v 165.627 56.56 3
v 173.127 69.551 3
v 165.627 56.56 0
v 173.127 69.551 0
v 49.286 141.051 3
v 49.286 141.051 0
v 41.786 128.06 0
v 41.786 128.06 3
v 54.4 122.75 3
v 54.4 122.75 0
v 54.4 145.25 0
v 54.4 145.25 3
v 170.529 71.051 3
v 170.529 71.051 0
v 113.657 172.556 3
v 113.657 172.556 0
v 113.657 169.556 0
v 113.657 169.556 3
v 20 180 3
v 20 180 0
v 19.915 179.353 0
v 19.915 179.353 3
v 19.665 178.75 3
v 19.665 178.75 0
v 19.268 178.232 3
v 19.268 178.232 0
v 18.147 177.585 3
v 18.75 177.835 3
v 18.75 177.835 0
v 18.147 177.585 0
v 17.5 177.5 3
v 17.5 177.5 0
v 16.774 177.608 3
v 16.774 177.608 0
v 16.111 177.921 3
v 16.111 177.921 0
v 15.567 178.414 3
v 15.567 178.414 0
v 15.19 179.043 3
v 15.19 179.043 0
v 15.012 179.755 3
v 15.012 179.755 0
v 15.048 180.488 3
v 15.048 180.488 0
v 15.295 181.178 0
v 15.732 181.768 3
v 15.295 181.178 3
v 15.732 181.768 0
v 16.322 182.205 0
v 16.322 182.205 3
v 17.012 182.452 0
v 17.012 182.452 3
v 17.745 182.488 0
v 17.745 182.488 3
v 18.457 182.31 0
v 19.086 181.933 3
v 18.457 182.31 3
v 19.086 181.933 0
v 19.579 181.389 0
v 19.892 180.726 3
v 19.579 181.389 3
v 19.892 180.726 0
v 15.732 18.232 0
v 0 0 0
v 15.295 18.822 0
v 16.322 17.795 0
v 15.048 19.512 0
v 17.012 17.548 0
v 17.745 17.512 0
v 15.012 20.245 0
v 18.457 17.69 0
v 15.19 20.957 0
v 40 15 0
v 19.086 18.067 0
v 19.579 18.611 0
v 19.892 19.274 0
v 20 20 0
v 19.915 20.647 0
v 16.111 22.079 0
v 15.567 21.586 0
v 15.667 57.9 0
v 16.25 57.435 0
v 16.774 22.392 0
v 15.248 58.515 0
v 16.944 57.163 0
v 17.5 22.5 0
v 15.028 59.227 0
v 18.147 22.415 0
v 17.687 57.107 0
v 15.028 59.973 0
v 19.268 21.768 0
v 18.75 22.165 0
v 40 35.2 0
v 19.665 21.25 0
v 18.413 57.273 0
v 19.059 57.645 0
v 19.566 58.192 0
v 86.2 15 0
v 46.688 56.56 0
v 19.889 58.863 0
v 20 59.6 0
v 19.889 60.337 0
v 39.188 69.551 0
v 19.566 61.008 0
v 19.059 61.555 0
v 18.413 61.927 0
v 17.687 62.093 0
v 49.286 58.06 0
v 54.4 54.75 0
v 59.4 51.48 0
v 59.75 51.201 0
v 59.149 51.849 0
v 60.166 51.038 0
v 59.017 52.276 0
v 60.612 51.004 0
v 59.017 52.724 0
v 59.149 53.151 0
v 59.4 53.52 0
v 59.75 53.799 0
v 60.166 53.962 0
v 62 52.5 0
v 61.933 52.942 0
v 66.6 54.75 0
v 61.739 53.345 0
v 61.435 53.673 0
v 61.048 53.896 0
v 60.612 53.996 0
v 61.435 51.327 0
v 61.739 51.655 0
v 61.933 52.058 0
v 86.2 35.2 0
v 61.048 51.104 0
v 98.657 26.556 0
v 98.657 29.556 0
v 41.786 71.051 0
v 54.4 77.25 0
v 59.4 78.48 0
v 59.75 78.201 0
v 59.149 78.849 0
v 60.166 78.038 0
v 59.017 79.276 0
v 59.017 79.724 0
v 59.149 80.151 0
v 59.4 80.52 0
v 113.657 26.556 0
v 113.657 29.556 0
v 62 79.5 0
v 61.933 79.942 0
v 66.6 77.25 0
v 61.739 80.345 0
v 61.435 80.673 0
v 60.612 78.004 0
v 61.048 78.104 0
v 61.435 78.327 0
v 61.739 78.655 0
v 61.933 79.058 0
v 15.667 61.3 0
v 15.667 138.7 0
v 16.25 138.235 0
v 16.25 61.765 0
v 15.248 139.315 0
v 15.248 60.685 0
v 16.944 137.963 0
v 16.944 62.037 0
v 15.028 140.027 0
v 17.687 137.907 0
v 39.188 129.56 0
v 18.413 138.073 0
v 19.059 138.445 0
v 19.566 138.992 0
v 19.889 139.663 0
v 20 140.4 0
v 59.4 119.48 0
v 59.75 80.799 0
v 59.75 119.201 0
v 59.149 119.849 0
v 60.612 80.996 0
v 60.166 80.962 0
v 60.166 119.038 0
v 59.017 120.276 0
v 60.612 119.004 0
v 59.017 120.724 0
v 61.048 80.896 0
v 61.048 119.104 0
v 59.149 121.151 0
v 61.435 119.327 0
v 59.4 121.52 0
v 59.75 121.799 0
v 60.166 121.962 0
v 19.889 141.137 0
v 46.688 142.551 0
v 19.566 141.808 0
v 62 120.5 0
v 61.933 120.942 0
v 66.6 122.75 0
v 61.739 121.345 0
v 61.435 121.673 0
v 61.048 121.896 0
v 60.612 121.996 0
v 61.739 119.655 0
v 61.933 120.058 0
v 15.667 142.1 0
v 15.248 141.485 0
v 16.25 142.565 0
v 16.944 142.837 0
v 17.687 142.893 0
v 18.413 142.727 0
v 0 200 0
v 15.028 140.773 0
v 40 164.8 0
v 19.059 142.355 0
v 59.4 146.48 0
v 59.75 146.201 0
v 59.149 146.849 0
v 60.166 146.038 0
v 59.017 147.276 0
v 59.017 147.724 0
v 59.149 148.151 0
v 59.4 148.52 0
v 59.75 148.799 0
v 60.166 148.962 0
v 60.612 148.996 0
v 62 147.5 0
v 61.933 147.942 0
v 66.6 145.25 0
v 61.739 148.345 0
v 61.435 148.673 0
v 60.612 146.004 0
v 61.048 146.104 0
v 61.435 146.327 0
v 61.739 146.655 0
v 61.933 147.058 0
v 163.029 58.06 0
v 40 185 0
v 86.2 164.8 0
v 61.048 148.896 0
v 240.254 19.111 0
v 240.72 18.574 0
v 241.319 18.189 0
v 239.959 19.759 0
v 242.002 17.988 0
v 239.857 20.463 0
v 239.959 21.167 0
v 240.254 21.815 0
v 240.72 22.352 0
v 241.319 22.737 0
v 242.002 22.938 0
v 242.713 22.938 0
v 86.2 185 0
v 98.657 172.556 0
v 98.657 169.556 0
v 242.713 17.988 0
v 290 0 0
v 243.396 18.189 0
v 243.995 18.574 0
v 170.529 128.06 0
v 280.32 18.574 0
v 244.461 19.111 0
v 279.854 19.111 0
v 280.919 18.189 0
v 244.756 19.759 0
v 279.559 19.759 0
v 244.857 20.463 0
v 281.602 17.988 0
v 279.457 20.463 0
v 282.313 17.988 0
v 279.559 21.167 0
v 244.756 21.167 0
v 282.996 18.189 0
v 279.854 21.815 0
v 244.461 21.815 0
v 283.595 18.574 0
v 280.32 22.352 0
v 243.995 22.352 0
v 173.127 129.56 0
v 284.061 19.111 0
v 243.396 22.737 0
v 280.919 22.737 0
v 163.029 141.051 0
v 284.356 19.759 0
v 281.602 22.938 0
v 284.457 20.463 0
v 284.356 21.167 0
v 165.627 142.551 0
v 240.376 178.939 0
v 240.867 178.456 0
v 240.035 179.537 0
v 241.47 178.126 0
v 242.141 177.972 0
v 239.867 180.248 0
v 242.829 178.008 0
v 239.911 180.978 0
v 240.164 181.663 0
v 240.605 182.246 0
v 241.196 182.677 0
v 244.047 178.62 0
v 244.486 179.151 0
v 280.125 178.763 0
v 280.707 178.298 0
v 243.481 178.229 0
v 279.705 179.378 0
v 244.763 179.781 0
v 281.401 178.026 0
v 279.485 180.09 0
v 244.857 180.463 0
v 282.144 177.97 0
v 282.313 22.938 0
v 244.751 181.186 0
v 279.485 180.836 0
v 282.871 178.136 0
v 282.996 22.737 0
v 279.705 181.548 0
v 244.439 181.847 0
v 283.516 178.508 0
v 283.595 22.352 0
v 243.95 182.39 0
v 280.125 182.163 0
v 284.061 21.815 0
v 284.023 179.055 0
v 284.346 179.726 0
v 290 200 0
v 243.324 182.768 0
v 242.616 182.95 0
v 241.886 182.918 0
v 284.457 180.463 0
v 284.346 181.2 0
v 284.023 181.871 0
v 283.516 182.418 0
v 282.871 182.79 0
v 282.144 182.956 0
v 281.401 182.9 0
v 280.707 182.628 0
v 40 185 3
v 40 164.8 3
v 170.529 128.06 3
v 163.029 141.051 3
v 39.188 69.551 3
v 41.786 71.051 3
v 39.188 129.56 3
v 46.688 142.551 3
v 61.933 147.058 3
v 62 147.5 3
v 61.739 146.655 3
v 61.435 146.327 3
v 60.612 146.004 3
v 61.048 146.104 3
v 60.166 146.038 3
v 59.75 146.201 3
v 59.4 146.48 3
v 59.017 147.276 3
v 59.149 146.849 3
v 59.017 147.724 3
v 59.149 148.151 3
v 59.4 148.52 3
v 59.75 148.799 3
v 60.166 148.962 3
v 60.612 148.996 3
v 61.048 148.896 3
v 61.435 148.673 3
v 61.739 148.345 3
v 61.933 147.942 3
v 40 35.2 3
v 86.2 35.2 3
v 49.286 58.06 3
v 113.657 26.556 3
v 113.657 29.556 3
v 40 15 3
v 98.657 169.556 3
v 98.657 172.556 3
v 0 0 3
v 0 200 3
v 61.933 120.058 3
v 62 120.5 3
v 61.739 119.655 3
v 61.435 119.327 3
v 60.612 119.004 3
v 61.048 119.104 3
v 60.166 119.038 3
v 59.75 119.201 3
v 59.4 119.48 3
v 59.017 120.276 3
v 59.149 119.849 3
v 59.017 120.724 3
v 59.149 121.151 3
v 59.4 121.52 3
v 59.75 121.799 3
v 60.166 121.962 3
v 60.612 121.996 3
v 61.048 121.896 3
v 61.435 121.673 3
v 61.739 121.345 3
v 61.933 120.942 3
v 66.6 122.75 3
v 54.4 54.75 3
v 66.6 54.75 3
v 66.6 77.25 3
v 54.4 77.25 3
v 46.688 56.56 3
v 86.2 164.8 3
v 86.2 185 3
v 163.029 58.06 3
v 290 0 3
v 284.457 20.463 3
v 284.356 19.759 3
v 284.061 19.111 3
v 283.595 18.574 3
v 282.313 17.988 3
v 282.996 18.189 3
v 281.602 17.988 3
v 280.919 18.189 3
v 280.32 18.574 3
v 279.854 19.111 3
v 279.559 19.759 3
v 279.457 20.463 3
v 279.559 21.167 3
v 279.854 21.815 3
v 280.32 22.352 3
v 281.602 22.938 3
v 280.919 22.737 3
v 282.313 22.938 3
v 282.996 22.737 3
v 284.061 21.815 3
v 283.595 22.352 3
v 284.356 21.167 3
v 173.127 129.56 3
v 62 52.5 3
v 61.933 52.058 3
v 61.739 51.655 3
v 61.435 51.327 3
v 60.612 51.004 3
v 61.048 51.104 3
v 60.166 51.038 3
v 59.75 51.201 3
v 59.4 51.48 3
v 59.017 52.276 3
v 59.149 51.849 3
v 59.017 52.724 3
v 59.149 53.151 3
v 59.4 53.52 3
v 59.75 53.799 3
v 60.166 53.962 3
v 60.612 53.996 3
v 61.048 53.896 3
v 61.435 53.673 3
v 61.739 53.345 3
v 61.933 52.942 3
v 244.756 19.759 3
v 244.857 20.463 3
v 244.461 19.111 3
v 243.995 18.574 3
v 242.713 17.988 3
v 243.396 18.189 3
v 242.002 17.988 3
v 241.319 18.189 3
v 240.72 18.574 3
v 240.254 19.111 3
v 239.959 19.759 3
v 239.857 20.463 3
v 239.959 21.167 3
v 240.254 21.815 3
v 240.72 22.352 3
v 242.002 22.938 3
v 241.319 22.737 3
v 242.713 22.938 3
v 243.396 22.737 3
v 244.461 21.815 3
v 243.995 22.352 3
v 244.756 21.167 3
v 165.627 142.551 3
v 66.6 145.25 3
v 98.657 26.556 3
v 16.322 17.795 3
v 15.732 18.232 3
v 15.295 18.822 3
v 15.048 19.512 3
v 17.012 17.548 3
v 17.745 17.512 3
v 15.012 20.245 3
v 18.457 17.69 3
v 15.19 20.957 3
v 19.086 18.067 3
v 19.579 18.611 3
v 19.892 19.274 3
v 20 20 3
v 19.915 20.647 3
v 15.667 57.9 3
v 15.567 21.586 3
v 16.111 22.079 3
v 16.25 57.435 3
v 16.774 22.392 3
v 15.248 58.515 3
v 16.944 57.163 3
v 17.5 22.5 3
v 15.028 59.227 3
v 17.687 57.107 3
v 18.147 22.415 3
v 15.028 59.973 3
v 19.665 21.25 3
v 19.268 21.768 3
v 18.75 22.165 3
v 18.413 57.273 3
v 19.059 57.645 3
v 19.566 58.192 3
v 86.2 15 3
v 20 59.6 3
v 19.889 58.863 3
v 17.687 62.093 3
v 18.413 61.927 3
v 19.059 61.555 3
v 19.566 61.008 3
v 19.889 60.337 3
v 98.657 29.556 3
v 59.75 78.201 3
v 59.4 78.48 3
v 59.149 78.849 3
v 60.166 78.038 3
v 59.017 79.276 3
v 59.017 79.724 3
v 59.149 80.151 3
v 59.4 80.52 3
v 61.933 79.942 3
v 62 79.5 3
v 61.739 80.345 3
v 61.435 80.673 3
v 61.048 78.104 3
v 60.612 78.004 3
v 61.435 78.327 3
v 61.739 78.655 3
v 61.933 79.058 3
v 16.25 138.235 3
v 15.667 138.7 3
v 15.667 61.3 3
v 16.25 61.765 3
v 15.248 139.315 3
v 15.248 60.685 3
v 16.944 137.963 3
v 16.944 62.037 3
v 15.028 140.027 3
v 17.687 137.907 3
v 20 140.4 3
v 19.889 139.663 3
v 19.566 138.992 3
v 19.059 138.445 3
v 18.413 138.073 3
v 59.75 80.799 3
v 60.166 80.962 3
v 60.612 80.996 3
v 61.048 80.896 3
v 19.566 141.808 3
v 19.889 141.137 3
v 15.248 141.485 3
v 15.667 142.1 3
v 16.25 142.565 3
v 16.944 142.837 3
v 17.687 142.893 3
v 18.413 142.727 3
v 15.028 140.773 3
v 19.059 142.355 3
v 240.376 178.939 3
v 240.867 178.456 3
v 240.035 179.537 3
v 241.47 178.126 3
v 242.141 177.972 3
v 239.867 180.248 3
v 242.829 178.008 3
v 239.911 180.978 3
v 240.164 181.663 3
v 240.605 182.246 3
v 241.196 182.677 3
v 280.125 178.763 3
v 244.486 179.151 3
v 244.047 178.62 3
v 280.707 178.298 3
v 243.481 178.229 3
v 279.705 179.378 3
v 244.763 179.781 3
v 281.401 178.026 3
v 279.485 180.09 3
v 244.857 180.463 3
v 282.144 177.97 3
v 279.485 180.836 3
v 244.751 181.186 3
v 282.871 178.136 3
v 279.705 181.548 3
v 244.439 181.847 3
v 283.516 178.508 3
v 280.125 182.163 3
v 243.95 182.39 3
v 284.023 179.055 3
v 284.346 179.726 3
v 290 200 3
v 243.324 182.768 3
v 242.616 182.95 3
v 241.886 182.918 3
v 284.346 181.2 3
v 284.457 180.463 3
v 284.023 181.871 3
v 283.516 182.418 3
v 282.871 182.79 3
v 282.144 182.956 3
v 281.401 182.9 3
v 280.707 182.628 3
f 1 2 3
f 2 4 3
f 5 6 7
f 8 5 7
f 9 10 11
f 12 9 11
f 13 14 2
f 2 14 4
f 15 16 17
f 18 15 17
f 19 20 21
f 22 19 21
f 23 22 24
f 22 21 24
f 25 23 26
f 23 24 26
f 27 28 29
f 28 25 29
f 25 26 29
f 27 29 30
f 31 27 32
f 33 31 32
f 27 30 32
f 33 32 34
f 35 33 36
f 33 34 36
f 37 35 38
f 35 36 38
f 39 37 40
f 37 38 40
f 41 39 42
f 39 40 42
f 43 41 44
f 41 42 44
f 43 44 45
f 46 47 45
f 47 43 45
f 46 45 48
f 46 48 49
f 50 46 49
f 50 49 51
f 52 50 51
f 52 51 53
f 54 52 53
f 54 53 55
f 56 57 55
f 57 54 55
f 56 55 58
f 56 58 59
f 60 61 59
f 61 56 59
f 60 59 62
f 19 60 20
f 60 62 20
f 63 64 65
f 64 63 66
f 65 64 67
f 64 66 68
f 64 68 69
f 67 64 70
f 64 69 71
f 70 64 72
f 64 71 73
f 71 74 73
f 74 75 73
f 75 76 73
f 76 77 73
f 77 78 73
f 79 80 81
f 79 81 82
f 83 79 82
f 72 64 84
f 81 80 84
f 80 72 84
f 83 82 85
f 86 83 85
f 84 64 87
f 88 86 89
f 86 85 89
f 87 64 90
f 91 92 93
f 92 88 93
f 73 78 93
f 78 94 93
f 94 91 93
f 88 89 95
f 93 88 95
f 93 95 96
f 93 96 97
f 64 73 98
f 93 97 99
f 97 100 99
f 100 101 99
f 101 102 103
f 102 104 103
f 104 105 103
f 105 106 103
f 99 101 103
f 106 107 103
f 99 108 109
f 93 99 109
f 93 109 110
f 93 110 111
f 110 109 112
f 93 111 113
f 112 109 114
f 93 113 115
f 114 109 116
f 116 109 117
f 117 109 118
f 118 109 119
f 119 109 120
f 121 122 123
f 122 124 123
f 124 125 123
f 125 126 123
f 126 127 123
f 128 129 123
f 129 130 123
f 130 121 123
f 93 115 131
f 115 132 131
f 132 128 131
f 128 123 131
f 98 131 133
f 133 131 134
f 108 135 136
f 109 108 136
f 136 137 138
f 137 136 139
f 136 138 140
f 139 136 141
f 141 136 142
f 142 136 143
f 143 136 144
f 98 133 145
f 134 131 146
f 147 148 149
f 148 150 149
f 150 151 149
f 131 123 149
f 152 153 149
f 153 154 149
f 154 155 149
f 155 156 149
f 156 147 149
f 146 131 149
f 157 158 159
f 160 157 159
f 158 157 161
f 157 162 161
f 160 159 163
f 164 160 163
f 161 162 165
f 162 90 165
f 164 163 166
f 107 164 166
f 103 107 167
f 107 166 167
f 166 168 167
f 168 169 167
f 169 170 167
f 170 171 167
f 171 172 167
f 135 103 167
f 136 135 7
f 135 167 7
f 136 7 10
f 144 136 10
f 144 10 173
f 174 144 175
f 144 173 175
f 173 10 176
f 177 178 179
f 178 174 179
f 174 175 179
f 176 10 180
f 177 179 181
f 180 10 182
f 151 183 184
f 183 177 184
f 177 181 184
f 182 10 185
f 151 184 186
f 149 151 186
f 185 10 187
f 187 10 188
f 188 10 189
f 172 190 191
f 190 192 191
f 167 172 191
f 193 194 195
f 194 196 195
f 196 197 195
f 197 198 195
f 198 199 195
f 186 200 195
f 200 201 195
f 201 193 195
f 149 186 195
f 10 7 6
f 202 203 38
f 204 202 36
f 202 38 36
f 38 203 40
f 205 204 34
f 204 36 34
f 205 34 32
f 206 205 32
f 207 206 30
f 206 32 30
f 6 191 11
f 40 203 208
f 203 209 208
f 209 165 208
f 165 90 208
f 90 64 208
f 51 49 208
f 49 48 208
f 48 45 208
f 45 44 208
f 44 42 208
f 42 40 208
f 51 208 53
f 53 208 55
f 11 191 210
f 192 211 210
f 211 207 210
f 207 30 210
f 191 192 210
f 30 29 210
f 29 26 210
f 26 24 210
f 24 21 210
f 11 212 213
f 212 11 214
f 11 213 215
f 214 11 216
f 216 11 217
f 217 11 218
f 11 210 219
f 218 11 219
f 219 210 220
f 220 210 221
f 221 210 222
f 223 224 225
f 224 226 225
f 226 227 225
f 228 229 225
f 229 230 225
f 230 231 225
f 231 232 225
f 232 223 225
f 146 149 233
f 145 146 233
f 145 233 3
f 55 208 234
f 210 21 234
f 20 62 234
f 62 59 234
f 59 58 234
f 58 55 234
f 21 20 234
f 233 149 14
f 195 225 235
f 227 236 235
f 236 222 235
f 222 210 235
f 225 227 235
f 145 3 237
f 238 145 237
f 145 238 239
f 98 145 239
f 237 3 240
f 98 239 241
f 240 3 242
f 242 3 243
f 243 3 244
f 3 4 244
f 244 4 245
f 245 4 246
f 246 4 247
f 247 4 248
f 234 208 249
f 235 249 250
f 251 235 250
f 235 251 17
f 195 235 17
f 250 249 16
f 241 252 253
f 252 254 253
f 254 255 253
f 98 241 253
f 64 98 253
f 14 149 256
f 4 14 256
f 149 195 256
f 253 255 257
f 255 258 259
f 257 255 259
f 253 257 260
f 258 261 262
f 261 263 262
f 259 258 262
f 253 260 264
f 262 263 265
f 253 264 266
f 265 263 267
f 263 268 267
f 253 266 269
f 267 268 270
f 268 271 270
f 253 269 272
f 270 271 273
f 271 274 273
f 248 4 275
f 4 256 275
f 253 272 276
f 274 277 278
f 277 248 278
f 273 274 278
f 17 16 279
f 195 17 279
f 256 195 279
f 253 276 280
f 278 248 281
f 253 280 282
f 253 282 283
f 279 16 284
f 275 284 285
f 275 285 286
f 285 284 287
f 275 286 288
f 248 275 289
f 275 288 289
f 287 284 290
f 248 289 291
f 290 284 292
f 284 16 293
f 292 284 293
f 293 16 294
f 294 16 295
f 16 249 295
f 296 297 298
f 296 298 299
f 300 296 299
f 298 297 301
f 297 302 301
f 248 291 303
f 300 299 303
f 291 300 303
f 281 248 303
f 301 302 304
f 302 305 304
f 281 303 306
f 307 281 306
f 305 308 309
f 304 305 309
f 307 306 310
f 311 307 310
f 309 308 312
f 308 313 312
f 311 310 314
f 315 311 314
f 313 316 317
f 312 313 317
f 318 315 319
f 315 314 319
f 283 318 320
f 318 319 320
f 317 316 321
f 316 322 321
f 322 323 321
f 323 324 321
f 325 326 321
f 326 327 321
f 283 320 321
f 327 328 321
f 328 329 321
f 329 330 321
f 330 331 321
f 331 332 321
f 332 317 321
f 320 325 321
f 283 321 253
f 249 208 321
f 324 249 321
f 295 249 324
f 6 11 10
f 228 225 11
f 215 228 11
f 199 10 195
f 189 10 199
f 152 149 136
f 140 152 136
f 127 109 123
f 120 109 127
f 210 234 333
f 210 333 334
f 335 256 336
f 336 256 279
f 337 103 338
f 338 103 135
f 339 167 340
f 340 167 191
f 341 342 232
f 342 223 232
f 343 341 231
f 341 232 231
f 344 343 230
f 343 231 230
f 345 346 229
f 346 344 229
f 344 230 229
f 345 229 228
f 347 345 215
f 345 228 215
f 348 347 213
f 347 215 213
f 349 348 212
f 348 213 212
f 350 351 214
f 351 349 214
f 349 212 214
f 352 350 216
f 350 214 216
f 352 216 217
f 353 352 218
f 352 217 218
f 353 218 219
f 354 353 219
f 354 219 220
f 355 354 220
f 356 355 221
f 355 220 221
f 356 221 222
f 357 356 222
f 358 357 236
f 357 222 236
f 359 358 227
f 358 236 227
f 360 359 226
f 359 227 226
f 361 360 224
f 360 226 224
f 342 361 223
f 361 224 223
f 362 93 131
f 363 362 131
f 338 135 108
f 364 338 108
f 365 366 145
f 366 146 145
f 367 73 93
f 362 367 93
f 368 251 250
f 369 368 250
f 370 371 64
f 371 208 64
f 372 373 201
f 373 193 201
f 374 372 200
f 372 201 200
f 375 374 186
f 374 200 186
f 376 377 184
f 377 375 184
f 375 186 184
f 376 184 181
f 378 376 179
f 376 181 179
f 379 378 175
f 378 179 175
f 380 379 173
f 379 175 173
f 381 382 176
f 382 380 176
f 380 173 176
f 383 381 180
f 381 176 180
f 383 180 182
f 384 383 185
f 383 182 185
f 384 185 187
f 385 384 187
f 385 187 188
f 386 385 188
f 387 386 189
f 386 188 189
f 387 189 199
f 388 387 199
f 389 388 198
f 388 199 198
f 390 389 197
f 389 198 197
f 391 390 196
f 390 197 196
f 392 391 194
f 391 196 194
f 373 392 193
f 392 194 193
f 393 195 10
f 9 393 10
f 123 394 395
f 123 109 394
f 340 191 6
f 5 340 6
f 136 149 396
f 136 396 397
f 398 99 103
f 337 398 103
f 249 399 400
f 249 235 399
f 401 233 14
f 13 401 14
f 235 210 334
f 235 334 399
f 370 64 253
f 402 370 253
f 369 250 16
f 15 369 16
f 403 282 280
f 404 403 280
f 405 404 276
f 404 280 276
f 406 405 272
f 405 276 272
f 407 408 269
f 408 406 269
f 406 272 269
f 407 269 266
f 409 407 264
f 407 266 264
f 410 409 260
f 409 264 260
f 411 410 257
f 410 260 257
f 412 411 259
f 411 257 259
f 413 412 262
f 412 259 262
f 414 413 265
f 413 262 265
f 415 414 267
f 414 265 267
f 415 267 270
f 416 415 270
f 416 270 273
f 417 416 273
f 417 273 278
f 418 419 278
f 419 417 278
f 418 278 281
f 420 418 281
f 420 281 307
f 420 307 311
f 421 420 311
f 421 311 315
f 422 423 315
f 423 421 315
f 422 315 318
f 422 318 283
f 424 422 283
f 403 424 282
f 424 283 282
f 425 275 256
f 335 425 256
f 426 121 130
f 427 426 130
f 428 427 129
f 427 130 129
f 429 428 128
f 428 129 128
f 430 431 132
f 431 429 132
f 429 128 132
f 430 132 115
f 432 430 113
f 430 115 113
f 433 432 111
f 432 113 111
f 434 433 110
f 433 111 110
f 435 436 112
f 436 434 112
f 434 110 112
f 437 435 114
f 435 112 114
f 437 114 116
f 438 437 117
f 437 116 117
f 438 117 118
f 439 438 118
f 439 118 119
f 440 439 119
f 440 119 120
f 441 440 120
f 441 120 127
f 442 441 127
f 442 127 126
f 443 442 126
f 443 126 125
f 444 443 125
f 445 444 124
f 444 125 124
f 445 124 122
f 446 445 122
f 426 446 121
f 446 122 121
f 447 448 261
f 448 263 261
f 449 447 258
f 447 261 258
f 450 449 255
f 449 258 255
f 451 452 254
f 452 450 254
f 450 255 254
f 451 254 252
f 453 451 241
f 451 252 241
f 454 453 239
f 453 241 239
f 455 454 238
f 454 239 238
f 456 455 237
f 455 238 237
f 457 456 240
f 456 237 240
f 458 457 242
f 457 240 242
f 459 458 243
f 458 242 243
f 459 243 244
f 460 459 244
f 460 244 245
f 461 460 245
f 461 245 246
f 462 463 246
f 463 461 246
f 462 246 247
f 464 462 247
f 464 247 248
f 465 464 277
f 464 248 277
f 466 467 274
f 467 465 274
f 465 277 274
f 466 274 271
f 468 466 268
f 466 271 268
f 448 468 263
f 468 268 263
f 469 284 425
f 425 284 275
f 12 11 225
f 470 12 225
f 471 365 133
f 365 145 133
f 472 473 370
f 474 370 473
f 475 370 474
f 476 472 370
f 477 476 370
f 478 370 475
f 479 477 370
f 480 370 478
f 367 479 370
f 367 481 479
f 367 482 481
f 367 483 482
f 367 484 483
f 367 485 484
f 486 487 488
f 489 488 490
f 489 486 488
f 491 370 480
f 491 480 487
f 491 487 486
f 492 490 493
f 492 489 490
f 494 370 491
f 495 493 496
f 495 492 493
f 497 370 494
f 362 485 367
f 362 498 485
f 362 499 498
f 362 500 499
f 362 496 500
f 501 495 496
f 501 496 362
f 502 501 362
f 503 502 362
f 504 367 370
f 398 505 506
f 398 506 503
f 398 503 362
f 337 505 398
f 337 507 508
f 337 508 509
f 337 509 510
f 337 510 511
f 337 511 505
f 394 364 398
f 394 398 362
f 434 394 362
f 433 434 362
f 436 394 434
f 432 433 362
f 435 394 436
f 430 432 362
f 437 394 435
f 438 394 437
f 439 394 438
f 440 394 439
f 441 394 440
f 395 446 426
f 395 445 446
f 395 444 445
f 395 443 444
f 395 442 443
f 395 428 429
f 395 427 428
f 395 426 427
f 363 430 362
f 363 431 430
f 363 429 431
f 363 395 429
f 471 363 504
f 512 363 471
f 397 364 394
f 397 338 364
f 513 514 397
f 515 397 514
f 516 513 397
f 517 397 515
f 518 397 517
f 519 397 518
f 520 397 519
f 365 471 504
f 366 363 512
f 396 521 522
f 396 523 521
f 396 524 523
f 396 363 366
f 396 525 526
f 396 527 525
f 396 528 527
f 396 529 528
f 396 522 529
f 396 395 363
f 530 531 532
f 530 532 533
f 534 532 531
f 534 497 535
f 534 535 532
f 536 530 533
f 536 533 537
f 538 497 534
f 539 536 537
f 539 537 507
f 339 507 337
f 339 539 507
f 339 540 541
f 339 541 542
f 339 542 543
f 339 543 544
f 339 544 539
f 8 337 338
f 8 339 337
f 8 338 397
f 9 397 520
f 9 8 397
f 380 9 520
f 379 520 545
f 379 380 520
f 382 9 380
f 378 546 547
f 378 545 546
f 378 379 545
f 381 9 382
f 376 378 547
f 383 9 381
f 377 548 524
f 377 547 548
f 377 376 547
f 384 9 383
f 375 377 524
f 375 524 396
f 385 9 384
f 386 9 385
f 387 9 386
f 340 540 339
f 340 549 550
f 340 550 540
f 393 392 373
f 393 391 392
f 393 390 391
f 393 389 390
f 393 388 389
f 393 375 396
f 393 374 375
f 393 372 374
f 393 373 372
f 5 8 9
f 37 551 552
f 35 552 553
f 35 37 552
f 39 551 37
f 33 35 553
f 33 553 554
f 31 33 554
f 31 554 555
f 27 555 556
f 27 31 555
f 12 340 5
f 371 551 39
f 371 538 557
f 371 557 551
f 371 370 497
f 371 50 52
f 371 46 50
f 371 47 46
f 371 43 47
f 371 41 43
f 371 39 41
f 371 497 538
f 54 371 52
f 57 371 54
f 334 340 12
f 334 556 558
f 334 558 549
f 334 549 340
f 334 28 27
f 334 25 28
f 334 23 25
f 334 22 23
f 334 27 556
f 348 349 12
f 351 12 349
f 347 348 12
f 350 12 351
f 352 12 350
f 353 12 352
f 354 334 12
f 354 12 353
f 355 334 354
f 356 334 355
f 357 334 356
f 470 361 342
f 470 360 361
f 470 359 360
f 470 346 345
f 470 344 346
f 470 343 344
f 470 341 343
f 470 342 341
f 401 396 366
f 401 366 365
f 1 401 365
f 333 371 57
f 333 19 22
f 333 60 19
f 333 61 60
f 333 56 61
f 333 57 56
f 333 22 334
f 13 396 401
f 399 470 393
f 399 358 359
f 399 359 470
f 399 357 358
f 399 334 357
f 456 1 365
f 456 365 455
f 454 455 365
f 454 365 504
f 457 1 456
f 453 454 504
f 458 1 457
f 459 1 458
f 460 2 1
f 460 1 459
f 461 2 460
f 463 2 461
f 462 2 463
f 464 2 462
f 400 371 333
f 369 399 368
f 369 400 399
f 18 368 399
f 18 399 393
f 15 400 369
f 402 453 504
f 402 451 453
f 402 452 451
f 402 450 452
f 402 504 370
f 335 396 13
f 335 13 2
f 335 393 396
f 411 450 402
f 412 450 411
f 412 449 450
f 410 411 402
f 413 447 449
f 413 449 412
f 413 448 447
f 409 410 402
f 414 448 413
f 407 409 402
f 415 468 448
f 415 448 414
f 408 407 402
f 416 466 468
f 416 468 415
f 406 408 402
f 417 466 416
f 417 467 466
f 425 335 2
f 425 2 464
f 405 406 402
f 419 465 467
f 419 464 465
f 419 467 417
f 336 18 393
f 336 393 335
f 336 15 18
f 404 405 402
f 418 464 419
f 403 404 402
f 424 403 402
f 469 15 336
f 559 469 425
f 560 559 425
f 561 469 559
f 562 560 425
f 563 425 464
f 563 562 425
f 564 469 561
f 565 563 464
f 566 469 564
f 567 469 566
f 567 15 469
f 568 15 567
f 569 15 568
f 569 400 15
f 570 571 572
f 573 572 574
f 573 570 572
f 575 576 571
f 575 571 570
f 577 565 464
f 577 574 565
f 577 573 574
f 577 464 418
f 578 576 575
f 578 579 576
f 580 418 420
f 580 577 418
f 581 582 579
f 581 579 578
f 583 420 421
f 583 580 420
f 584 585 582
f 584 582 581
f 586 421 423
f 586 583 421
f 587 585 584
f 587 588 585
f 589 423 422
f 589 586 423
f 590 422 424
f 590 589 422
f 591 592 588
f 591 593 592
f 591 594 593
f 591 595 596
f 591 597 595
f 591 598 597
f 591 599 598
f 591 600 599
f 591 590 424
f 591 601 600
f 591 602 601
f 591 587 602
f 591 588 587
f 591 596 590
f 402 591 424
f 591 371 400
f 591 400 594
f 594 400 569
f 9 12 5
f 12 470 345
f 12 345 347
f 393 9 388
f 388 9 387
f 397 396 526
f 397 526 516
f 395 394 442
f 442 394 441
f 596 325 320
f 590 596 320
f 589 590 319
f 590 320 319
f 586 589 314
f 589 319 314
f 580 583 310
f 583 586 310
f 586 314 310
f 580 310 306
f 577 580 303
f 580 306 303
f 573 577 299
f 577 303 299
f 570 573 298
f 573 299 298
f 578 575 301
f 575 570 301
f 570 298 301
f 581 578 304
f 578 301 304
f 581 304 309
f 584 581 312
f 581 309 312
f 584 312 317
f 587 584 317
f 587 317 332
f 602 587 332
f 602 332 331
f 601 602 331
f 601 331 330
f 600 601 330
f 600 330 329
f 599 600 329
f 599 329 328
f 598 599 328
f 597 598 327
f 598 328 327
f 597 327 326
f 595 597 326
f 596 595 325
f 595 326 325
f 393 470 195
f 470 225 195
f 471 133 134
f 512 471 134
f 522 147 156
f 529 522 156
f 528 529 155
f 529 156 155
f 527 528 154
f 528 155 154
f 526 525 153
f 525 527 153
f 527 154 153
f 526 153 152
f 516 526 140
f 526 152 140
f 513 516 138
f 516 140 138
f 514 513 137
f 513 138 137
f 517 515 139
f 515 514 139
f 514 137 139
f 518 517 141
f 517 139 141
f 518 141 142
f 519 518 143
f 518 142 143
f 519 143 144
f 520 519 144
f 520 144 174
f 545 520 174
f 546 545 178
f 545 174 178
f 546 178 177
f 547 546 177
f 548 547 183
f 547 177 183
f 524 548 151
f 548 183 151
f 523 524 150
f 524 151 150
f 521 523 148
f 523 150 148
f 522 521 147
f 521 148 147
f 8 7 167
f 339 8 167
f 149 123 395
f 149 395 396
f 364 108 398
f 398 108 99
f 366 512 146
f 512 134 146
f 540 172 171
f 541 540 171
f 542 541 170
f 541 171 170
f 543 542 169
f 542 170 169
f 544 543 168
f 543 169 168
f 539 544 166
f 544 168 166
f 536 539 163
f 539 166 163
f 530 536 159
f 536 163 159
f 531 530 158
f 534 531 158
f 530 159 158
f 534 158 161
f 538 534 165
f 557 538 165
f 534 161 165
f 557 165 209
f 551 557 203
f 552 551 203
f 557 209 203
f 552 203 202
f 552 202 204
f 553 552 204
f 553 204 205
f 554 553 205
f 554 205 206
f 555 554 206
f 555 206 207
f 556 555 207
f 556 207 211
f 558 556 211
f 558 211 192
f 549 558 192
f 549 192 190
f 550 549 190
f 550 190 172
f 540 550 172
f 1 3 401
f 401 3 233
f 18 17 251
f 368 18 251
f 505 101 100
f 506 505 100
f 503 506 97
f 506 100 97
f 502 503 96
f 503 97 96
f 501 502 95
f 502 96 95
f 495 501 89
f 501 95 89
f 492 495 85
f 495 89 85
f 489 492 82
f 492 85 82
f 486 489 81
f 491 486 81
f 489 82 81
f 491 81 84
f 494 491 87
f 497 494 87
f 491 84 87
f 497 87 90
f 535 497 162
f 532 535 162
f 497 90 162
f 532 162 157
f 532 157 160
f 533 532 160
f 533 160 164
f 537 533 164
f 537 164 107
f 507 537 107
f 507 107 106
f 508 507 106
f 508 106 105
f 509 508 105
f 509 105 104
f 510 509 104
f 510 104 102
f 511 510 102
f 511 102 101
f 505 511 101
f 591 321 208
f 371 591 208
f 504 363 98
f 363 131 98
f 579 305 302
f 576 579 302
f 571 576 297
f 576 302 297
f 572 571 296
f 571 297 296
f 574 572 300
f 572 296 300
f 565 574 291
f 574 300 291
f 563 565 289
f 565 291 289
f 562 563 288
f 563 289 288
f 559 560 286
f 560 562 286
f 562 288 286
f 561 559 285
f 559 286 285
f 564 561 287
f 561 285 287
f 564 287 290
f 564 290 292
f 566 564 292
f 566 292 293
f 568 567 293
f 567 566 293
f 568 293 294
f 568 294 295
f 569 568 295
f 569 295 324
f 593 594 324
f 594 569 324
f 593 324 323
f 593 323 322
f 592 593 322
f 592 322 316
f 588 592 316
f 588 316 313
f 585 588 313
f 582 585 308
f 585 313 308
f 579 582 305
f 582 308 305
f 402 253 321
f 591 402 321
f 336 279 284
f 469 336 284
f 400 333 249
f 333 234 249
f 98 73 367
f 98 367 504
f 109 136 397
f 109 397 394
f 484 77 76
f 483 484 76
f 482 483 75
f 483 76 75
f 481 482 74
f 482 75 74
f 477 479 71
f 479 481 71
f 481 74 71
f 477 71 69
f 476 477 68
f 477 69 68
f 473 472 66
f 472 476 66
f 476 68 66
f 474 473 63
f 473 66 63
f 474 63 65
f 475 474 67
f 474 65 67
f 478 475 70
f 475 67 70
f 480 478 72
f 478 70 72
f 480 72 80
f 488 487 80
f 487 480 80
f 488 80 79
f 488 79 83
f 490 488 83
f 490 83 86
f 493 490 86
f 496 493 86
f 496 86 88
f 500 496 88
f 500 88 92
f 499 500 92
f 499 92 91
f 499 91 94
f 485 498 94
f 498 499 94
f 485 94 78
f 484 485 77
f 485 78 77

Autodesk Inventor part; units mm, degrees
ref_plane "YZ Plane" through (0, 0, 0) normal (1, 0, 0) x (0, 1, 0)
ref_plane "XZ Plane" through (0, 0, 0) normal (0, 1, 0) x (-1, 0, 0)
ref_plane "XY Plane" through (0, 0, 0) normal (0, 0, 1) x (1, 0, 0)
sketch "Sketch1" plane through (0, 0, 0) normal (0, 0, 1) x (1, 0, 0)
  line L0 (173.1273, 69.5507) -> (165.6273, 56.5604)
  line L1 (165.6273, 56.5604) -> (163.0292, 58.0604)
  line L2 (163.0292, 58.0604) -> (170.5292, 71.0507)
  line L3 (170.5292, 71.0507) -> (173.1273, 69.5507)
  line L4 (113.6574, 26.5556) -> (98.6574, 26.5556)
  line L5 (98.6574, 26.5556) -> (98.6574, 29.5556)
  line L6 (98.6574, 29.5556) -> (113.6574, 29.5556)
  line L7 (113.6574, 29.5556) -> (113.6574, 26.5556)
  line L8 (46.6875, 142.5507) -> (49.2856, 141.0507)
  line L9 (49.2856, 141.0507) -> (41.7856, 128.0604)
  line L10 (41.7856, 128.0604) -> (39.1875, 129.5604)
  line L11 (39.1875, 129.5604) -> (46.6875, 142.5507)
  line L12 (46.6875, 56.5604) -> (39.1875, 69.5507)
  line L13 (39.1875, 69.5507) -> (41.7856, 71.0507)
  line L14 (41.7856, 71.0507) -> (49.2856, 58.0604)
  line L15 (49.2856, 58.0604) -> (46.6875, 56.5604)
  line L16 (98.6574, 172.5556) -> (113.6574, 172.5556)
  line L17 (113.6574, 172.5556) -> (113.6574, 169.5556)
  line L18 (113.6574, 169.5556) -> (98.6574, 169.5556)
  line L19 (98.6574, 169.5556) -> (98.6574, 172.5556)
  line L20 (165.6273, 142.5507) -> (173.1273, 129.5604)
  line L21 (173.1273, 129.5604) -> (170.5292, 128.0604)
  line L22 (170.5292, 128.0604) -> (163.0292, 141.0507)
  line L23 (163.0292, 141.0507) -> (165.6273, 142.5507)
  line L24 (290, 0) -> (290, 200)
  line L25 (290, 200) -> (0, 200)
  line L26 (0, 200) -> (0, 0)
  line L27 (0, 0) -> (290, 0)
  circle A0 centre (281.9574, 20.463) radius 2.5
  circle A1 centre (49.9574, 20.463) radius 2.5
  circle A2 centre (281.9574, 180.463) radius 2.5
  circle A3 centre (49.9574, 180.463) radius 2.5
  circle A4 centre (242.3574, 20.463) radius 2.5
  circle A5 centre (17.5, 20) radius 2.5
  circle A6 centre (17.5, 180) radius 2.5
  circle A7 centre (242.3574, 180.463) radius 2.5
  line L28 (0, 0) -> (0, 10)
  line L29 (0, 10) -> (0, 15)
  line L30 (0, 200) -> (0, 185)
  line L31 (0, 185) -> (60, 185)
  line L32 (60, 185) -> (60, 175)
  line L33 (60, 175) -> (0, 175)
  line L34 (0, 15) -> (70, 15)
  line L35 (70, 15) -> (70, 25)
  line L36 (70, 25) -> (0, 25)
  line L37 (60, 185) -> (70, 185)
  line L38 (70, 185) -> (70, 175)
  line L39 (70, 175) -> (60, 175)
  line L40 (281.9574, 20.463) -> (242.3574, 20.463)
  line L41 (242.3574, 20.463) -> (130.1488, 20.463)
  circle A8 centre (182.3574, 20.463) radius 2.5
  circle A9 centre (142.7574, 20.463) radius 2.5
  line L42 (0, 100) -> (290, 100)
  line L43 (242.3574, 179.537) -> (130.1488, 179.537)
  circle A10 centre (182.3574, 179.537) radius 2.5
  circle A11 centre (142.7574, 179.537) radius 2.5
  circle A12 centre (17.5, 59.6) radius 2.5
  circle A13 centre (17.5, 140.4) radius 2.5
  line L44 (40, 35.2) -> (86.2, 35.2)
  line L45 (86.2, 35.2) -> (86.2, 15)
  line L46 (86.2, 15) -> (40, 15)
  line L47 (40, 15) -> (40, 35.2)
  line L48 (40, 164.8) -> (86.2, 164.8)
  line L49 (86.2, 164.8) -> (86.2, 185)
  line L50 (86.2, 185) -> (40, 185)
  line L51 (40, 185) -> (40, 164.8)
  line L52 (17.5, 20) -> (17.5, 180)
  line L53 (55, 50) -> (66, 50)
  line L54 (66, 50) -> (66, 82)
  line L55 (66, 82) -> (55, 82)
  line L56 (55, 82) -> (55, 50)
  circle A14 centre (60.5, 52.5) radius 1.5
  circle A15 centre (60.5, 79.5) radius 1.5
  line L57 (54.4, 54.75) -> (66.6, 54.75)
  line L58 (66.6, 54.75) -> (66.6, 77.25)
  line L59 (66.6, 77.25) -> (54.4, 77.25)
  line L60 (54.4, 77.25) -> (54.4, 54.75)
  line L61 (55, 150) -> (66, 150)
  line L62 (66, 150) -> (66, 118)
  line L63 (66, 118) -> (55, 118)
  line L64 (55, 118) -> (55, 150)
  circle A16 centre (60.5, 147.5) radius 1.5
  circle A17 centre (60.5, 120.5) radius 1.5
  line L65 (54.4, 145.25) -> (66.6, 145.25)
  line L66 (66.6, 145.25) -> (66.6, 122.75)
  line L67 (66.6, 122.75) -> (54.4, 122.75)
  line L68 (54.4, 122.75) -> (54.4, 145.25)
  point P0 (66.6, 66)
  point P1 (66, 66)
  point P2 (60.5, 54.75)
  point P3 (60.5, 50)
  point P4 (66.6, 134)
  point P5 (66, 134)
  point P6 (60.5, 145.25)
  point P7 (60.5, 150)
  dimension "d2" = 10
  dimension "d3" = 5
  dimension "d6" = 15
  dimension "d7" = 60
  dimension "d8" = 10
  dimension "d9" = 70
  dimension "d10" = 10
  dimension "d11" = 10
  dimension "d12" = 10
  dimension "d13" = 5
  dimension "d14" = 5
  dimension "d15" = 39.6
  dimension "d16" = 39.6
  dimension "d17" = 60
  dimension "d18" = 8.0426
  dimension "d19" = 39.6
  dimension "d20" = 20.2
  dimension "d21" = 46.2
  dimension "d22" = 15
  dimension "d23" = 40
  dimension "d24" = 17.5
  dimension "d25" = 5
  dimension "d26" = 5
  dimension "d27" = 20
  dimension "d28" = 20
  dimension "d29" = 39.6
  dimension "d30" = 55
  dimension "d31" = 50
  dimension "d32" = 11
  dimension "d33" = 32
  dimension "d34" = 3
  dimension "d35" = 3
  dimension "d36" = 2.5
  dimension "d37" = 2.5
  dimension "d38" = 22.5
  dimension "d39" = 12.2
extrude "Extrusion1" add sketch "Sketch1" along normal blind 3 contours L27 L26 L34 L46 L45 L44 L47 L36 L52 A12 L42 L24 | L42 L52 A13 L33 L51 L48 L49 L50 L37 L31 L26 L25 L24 | L52 A12 L36 L26 L42 | L42 L26 L33 L52 A13 | L26 L36 L47 L34 | L31 L51 L33 L26 | A9 L41 | L41 A9 | A8 L41 | L41 A8 | A11 L43 | L43 A11 | A10 L43 | L43 A10 | L56 L57 L54 L53 | L56 L55 L54 L59 | L61 L62 L65 L64 | L67 L62 L63 L64
properties material "MDF Medium Density Fiberboard"
